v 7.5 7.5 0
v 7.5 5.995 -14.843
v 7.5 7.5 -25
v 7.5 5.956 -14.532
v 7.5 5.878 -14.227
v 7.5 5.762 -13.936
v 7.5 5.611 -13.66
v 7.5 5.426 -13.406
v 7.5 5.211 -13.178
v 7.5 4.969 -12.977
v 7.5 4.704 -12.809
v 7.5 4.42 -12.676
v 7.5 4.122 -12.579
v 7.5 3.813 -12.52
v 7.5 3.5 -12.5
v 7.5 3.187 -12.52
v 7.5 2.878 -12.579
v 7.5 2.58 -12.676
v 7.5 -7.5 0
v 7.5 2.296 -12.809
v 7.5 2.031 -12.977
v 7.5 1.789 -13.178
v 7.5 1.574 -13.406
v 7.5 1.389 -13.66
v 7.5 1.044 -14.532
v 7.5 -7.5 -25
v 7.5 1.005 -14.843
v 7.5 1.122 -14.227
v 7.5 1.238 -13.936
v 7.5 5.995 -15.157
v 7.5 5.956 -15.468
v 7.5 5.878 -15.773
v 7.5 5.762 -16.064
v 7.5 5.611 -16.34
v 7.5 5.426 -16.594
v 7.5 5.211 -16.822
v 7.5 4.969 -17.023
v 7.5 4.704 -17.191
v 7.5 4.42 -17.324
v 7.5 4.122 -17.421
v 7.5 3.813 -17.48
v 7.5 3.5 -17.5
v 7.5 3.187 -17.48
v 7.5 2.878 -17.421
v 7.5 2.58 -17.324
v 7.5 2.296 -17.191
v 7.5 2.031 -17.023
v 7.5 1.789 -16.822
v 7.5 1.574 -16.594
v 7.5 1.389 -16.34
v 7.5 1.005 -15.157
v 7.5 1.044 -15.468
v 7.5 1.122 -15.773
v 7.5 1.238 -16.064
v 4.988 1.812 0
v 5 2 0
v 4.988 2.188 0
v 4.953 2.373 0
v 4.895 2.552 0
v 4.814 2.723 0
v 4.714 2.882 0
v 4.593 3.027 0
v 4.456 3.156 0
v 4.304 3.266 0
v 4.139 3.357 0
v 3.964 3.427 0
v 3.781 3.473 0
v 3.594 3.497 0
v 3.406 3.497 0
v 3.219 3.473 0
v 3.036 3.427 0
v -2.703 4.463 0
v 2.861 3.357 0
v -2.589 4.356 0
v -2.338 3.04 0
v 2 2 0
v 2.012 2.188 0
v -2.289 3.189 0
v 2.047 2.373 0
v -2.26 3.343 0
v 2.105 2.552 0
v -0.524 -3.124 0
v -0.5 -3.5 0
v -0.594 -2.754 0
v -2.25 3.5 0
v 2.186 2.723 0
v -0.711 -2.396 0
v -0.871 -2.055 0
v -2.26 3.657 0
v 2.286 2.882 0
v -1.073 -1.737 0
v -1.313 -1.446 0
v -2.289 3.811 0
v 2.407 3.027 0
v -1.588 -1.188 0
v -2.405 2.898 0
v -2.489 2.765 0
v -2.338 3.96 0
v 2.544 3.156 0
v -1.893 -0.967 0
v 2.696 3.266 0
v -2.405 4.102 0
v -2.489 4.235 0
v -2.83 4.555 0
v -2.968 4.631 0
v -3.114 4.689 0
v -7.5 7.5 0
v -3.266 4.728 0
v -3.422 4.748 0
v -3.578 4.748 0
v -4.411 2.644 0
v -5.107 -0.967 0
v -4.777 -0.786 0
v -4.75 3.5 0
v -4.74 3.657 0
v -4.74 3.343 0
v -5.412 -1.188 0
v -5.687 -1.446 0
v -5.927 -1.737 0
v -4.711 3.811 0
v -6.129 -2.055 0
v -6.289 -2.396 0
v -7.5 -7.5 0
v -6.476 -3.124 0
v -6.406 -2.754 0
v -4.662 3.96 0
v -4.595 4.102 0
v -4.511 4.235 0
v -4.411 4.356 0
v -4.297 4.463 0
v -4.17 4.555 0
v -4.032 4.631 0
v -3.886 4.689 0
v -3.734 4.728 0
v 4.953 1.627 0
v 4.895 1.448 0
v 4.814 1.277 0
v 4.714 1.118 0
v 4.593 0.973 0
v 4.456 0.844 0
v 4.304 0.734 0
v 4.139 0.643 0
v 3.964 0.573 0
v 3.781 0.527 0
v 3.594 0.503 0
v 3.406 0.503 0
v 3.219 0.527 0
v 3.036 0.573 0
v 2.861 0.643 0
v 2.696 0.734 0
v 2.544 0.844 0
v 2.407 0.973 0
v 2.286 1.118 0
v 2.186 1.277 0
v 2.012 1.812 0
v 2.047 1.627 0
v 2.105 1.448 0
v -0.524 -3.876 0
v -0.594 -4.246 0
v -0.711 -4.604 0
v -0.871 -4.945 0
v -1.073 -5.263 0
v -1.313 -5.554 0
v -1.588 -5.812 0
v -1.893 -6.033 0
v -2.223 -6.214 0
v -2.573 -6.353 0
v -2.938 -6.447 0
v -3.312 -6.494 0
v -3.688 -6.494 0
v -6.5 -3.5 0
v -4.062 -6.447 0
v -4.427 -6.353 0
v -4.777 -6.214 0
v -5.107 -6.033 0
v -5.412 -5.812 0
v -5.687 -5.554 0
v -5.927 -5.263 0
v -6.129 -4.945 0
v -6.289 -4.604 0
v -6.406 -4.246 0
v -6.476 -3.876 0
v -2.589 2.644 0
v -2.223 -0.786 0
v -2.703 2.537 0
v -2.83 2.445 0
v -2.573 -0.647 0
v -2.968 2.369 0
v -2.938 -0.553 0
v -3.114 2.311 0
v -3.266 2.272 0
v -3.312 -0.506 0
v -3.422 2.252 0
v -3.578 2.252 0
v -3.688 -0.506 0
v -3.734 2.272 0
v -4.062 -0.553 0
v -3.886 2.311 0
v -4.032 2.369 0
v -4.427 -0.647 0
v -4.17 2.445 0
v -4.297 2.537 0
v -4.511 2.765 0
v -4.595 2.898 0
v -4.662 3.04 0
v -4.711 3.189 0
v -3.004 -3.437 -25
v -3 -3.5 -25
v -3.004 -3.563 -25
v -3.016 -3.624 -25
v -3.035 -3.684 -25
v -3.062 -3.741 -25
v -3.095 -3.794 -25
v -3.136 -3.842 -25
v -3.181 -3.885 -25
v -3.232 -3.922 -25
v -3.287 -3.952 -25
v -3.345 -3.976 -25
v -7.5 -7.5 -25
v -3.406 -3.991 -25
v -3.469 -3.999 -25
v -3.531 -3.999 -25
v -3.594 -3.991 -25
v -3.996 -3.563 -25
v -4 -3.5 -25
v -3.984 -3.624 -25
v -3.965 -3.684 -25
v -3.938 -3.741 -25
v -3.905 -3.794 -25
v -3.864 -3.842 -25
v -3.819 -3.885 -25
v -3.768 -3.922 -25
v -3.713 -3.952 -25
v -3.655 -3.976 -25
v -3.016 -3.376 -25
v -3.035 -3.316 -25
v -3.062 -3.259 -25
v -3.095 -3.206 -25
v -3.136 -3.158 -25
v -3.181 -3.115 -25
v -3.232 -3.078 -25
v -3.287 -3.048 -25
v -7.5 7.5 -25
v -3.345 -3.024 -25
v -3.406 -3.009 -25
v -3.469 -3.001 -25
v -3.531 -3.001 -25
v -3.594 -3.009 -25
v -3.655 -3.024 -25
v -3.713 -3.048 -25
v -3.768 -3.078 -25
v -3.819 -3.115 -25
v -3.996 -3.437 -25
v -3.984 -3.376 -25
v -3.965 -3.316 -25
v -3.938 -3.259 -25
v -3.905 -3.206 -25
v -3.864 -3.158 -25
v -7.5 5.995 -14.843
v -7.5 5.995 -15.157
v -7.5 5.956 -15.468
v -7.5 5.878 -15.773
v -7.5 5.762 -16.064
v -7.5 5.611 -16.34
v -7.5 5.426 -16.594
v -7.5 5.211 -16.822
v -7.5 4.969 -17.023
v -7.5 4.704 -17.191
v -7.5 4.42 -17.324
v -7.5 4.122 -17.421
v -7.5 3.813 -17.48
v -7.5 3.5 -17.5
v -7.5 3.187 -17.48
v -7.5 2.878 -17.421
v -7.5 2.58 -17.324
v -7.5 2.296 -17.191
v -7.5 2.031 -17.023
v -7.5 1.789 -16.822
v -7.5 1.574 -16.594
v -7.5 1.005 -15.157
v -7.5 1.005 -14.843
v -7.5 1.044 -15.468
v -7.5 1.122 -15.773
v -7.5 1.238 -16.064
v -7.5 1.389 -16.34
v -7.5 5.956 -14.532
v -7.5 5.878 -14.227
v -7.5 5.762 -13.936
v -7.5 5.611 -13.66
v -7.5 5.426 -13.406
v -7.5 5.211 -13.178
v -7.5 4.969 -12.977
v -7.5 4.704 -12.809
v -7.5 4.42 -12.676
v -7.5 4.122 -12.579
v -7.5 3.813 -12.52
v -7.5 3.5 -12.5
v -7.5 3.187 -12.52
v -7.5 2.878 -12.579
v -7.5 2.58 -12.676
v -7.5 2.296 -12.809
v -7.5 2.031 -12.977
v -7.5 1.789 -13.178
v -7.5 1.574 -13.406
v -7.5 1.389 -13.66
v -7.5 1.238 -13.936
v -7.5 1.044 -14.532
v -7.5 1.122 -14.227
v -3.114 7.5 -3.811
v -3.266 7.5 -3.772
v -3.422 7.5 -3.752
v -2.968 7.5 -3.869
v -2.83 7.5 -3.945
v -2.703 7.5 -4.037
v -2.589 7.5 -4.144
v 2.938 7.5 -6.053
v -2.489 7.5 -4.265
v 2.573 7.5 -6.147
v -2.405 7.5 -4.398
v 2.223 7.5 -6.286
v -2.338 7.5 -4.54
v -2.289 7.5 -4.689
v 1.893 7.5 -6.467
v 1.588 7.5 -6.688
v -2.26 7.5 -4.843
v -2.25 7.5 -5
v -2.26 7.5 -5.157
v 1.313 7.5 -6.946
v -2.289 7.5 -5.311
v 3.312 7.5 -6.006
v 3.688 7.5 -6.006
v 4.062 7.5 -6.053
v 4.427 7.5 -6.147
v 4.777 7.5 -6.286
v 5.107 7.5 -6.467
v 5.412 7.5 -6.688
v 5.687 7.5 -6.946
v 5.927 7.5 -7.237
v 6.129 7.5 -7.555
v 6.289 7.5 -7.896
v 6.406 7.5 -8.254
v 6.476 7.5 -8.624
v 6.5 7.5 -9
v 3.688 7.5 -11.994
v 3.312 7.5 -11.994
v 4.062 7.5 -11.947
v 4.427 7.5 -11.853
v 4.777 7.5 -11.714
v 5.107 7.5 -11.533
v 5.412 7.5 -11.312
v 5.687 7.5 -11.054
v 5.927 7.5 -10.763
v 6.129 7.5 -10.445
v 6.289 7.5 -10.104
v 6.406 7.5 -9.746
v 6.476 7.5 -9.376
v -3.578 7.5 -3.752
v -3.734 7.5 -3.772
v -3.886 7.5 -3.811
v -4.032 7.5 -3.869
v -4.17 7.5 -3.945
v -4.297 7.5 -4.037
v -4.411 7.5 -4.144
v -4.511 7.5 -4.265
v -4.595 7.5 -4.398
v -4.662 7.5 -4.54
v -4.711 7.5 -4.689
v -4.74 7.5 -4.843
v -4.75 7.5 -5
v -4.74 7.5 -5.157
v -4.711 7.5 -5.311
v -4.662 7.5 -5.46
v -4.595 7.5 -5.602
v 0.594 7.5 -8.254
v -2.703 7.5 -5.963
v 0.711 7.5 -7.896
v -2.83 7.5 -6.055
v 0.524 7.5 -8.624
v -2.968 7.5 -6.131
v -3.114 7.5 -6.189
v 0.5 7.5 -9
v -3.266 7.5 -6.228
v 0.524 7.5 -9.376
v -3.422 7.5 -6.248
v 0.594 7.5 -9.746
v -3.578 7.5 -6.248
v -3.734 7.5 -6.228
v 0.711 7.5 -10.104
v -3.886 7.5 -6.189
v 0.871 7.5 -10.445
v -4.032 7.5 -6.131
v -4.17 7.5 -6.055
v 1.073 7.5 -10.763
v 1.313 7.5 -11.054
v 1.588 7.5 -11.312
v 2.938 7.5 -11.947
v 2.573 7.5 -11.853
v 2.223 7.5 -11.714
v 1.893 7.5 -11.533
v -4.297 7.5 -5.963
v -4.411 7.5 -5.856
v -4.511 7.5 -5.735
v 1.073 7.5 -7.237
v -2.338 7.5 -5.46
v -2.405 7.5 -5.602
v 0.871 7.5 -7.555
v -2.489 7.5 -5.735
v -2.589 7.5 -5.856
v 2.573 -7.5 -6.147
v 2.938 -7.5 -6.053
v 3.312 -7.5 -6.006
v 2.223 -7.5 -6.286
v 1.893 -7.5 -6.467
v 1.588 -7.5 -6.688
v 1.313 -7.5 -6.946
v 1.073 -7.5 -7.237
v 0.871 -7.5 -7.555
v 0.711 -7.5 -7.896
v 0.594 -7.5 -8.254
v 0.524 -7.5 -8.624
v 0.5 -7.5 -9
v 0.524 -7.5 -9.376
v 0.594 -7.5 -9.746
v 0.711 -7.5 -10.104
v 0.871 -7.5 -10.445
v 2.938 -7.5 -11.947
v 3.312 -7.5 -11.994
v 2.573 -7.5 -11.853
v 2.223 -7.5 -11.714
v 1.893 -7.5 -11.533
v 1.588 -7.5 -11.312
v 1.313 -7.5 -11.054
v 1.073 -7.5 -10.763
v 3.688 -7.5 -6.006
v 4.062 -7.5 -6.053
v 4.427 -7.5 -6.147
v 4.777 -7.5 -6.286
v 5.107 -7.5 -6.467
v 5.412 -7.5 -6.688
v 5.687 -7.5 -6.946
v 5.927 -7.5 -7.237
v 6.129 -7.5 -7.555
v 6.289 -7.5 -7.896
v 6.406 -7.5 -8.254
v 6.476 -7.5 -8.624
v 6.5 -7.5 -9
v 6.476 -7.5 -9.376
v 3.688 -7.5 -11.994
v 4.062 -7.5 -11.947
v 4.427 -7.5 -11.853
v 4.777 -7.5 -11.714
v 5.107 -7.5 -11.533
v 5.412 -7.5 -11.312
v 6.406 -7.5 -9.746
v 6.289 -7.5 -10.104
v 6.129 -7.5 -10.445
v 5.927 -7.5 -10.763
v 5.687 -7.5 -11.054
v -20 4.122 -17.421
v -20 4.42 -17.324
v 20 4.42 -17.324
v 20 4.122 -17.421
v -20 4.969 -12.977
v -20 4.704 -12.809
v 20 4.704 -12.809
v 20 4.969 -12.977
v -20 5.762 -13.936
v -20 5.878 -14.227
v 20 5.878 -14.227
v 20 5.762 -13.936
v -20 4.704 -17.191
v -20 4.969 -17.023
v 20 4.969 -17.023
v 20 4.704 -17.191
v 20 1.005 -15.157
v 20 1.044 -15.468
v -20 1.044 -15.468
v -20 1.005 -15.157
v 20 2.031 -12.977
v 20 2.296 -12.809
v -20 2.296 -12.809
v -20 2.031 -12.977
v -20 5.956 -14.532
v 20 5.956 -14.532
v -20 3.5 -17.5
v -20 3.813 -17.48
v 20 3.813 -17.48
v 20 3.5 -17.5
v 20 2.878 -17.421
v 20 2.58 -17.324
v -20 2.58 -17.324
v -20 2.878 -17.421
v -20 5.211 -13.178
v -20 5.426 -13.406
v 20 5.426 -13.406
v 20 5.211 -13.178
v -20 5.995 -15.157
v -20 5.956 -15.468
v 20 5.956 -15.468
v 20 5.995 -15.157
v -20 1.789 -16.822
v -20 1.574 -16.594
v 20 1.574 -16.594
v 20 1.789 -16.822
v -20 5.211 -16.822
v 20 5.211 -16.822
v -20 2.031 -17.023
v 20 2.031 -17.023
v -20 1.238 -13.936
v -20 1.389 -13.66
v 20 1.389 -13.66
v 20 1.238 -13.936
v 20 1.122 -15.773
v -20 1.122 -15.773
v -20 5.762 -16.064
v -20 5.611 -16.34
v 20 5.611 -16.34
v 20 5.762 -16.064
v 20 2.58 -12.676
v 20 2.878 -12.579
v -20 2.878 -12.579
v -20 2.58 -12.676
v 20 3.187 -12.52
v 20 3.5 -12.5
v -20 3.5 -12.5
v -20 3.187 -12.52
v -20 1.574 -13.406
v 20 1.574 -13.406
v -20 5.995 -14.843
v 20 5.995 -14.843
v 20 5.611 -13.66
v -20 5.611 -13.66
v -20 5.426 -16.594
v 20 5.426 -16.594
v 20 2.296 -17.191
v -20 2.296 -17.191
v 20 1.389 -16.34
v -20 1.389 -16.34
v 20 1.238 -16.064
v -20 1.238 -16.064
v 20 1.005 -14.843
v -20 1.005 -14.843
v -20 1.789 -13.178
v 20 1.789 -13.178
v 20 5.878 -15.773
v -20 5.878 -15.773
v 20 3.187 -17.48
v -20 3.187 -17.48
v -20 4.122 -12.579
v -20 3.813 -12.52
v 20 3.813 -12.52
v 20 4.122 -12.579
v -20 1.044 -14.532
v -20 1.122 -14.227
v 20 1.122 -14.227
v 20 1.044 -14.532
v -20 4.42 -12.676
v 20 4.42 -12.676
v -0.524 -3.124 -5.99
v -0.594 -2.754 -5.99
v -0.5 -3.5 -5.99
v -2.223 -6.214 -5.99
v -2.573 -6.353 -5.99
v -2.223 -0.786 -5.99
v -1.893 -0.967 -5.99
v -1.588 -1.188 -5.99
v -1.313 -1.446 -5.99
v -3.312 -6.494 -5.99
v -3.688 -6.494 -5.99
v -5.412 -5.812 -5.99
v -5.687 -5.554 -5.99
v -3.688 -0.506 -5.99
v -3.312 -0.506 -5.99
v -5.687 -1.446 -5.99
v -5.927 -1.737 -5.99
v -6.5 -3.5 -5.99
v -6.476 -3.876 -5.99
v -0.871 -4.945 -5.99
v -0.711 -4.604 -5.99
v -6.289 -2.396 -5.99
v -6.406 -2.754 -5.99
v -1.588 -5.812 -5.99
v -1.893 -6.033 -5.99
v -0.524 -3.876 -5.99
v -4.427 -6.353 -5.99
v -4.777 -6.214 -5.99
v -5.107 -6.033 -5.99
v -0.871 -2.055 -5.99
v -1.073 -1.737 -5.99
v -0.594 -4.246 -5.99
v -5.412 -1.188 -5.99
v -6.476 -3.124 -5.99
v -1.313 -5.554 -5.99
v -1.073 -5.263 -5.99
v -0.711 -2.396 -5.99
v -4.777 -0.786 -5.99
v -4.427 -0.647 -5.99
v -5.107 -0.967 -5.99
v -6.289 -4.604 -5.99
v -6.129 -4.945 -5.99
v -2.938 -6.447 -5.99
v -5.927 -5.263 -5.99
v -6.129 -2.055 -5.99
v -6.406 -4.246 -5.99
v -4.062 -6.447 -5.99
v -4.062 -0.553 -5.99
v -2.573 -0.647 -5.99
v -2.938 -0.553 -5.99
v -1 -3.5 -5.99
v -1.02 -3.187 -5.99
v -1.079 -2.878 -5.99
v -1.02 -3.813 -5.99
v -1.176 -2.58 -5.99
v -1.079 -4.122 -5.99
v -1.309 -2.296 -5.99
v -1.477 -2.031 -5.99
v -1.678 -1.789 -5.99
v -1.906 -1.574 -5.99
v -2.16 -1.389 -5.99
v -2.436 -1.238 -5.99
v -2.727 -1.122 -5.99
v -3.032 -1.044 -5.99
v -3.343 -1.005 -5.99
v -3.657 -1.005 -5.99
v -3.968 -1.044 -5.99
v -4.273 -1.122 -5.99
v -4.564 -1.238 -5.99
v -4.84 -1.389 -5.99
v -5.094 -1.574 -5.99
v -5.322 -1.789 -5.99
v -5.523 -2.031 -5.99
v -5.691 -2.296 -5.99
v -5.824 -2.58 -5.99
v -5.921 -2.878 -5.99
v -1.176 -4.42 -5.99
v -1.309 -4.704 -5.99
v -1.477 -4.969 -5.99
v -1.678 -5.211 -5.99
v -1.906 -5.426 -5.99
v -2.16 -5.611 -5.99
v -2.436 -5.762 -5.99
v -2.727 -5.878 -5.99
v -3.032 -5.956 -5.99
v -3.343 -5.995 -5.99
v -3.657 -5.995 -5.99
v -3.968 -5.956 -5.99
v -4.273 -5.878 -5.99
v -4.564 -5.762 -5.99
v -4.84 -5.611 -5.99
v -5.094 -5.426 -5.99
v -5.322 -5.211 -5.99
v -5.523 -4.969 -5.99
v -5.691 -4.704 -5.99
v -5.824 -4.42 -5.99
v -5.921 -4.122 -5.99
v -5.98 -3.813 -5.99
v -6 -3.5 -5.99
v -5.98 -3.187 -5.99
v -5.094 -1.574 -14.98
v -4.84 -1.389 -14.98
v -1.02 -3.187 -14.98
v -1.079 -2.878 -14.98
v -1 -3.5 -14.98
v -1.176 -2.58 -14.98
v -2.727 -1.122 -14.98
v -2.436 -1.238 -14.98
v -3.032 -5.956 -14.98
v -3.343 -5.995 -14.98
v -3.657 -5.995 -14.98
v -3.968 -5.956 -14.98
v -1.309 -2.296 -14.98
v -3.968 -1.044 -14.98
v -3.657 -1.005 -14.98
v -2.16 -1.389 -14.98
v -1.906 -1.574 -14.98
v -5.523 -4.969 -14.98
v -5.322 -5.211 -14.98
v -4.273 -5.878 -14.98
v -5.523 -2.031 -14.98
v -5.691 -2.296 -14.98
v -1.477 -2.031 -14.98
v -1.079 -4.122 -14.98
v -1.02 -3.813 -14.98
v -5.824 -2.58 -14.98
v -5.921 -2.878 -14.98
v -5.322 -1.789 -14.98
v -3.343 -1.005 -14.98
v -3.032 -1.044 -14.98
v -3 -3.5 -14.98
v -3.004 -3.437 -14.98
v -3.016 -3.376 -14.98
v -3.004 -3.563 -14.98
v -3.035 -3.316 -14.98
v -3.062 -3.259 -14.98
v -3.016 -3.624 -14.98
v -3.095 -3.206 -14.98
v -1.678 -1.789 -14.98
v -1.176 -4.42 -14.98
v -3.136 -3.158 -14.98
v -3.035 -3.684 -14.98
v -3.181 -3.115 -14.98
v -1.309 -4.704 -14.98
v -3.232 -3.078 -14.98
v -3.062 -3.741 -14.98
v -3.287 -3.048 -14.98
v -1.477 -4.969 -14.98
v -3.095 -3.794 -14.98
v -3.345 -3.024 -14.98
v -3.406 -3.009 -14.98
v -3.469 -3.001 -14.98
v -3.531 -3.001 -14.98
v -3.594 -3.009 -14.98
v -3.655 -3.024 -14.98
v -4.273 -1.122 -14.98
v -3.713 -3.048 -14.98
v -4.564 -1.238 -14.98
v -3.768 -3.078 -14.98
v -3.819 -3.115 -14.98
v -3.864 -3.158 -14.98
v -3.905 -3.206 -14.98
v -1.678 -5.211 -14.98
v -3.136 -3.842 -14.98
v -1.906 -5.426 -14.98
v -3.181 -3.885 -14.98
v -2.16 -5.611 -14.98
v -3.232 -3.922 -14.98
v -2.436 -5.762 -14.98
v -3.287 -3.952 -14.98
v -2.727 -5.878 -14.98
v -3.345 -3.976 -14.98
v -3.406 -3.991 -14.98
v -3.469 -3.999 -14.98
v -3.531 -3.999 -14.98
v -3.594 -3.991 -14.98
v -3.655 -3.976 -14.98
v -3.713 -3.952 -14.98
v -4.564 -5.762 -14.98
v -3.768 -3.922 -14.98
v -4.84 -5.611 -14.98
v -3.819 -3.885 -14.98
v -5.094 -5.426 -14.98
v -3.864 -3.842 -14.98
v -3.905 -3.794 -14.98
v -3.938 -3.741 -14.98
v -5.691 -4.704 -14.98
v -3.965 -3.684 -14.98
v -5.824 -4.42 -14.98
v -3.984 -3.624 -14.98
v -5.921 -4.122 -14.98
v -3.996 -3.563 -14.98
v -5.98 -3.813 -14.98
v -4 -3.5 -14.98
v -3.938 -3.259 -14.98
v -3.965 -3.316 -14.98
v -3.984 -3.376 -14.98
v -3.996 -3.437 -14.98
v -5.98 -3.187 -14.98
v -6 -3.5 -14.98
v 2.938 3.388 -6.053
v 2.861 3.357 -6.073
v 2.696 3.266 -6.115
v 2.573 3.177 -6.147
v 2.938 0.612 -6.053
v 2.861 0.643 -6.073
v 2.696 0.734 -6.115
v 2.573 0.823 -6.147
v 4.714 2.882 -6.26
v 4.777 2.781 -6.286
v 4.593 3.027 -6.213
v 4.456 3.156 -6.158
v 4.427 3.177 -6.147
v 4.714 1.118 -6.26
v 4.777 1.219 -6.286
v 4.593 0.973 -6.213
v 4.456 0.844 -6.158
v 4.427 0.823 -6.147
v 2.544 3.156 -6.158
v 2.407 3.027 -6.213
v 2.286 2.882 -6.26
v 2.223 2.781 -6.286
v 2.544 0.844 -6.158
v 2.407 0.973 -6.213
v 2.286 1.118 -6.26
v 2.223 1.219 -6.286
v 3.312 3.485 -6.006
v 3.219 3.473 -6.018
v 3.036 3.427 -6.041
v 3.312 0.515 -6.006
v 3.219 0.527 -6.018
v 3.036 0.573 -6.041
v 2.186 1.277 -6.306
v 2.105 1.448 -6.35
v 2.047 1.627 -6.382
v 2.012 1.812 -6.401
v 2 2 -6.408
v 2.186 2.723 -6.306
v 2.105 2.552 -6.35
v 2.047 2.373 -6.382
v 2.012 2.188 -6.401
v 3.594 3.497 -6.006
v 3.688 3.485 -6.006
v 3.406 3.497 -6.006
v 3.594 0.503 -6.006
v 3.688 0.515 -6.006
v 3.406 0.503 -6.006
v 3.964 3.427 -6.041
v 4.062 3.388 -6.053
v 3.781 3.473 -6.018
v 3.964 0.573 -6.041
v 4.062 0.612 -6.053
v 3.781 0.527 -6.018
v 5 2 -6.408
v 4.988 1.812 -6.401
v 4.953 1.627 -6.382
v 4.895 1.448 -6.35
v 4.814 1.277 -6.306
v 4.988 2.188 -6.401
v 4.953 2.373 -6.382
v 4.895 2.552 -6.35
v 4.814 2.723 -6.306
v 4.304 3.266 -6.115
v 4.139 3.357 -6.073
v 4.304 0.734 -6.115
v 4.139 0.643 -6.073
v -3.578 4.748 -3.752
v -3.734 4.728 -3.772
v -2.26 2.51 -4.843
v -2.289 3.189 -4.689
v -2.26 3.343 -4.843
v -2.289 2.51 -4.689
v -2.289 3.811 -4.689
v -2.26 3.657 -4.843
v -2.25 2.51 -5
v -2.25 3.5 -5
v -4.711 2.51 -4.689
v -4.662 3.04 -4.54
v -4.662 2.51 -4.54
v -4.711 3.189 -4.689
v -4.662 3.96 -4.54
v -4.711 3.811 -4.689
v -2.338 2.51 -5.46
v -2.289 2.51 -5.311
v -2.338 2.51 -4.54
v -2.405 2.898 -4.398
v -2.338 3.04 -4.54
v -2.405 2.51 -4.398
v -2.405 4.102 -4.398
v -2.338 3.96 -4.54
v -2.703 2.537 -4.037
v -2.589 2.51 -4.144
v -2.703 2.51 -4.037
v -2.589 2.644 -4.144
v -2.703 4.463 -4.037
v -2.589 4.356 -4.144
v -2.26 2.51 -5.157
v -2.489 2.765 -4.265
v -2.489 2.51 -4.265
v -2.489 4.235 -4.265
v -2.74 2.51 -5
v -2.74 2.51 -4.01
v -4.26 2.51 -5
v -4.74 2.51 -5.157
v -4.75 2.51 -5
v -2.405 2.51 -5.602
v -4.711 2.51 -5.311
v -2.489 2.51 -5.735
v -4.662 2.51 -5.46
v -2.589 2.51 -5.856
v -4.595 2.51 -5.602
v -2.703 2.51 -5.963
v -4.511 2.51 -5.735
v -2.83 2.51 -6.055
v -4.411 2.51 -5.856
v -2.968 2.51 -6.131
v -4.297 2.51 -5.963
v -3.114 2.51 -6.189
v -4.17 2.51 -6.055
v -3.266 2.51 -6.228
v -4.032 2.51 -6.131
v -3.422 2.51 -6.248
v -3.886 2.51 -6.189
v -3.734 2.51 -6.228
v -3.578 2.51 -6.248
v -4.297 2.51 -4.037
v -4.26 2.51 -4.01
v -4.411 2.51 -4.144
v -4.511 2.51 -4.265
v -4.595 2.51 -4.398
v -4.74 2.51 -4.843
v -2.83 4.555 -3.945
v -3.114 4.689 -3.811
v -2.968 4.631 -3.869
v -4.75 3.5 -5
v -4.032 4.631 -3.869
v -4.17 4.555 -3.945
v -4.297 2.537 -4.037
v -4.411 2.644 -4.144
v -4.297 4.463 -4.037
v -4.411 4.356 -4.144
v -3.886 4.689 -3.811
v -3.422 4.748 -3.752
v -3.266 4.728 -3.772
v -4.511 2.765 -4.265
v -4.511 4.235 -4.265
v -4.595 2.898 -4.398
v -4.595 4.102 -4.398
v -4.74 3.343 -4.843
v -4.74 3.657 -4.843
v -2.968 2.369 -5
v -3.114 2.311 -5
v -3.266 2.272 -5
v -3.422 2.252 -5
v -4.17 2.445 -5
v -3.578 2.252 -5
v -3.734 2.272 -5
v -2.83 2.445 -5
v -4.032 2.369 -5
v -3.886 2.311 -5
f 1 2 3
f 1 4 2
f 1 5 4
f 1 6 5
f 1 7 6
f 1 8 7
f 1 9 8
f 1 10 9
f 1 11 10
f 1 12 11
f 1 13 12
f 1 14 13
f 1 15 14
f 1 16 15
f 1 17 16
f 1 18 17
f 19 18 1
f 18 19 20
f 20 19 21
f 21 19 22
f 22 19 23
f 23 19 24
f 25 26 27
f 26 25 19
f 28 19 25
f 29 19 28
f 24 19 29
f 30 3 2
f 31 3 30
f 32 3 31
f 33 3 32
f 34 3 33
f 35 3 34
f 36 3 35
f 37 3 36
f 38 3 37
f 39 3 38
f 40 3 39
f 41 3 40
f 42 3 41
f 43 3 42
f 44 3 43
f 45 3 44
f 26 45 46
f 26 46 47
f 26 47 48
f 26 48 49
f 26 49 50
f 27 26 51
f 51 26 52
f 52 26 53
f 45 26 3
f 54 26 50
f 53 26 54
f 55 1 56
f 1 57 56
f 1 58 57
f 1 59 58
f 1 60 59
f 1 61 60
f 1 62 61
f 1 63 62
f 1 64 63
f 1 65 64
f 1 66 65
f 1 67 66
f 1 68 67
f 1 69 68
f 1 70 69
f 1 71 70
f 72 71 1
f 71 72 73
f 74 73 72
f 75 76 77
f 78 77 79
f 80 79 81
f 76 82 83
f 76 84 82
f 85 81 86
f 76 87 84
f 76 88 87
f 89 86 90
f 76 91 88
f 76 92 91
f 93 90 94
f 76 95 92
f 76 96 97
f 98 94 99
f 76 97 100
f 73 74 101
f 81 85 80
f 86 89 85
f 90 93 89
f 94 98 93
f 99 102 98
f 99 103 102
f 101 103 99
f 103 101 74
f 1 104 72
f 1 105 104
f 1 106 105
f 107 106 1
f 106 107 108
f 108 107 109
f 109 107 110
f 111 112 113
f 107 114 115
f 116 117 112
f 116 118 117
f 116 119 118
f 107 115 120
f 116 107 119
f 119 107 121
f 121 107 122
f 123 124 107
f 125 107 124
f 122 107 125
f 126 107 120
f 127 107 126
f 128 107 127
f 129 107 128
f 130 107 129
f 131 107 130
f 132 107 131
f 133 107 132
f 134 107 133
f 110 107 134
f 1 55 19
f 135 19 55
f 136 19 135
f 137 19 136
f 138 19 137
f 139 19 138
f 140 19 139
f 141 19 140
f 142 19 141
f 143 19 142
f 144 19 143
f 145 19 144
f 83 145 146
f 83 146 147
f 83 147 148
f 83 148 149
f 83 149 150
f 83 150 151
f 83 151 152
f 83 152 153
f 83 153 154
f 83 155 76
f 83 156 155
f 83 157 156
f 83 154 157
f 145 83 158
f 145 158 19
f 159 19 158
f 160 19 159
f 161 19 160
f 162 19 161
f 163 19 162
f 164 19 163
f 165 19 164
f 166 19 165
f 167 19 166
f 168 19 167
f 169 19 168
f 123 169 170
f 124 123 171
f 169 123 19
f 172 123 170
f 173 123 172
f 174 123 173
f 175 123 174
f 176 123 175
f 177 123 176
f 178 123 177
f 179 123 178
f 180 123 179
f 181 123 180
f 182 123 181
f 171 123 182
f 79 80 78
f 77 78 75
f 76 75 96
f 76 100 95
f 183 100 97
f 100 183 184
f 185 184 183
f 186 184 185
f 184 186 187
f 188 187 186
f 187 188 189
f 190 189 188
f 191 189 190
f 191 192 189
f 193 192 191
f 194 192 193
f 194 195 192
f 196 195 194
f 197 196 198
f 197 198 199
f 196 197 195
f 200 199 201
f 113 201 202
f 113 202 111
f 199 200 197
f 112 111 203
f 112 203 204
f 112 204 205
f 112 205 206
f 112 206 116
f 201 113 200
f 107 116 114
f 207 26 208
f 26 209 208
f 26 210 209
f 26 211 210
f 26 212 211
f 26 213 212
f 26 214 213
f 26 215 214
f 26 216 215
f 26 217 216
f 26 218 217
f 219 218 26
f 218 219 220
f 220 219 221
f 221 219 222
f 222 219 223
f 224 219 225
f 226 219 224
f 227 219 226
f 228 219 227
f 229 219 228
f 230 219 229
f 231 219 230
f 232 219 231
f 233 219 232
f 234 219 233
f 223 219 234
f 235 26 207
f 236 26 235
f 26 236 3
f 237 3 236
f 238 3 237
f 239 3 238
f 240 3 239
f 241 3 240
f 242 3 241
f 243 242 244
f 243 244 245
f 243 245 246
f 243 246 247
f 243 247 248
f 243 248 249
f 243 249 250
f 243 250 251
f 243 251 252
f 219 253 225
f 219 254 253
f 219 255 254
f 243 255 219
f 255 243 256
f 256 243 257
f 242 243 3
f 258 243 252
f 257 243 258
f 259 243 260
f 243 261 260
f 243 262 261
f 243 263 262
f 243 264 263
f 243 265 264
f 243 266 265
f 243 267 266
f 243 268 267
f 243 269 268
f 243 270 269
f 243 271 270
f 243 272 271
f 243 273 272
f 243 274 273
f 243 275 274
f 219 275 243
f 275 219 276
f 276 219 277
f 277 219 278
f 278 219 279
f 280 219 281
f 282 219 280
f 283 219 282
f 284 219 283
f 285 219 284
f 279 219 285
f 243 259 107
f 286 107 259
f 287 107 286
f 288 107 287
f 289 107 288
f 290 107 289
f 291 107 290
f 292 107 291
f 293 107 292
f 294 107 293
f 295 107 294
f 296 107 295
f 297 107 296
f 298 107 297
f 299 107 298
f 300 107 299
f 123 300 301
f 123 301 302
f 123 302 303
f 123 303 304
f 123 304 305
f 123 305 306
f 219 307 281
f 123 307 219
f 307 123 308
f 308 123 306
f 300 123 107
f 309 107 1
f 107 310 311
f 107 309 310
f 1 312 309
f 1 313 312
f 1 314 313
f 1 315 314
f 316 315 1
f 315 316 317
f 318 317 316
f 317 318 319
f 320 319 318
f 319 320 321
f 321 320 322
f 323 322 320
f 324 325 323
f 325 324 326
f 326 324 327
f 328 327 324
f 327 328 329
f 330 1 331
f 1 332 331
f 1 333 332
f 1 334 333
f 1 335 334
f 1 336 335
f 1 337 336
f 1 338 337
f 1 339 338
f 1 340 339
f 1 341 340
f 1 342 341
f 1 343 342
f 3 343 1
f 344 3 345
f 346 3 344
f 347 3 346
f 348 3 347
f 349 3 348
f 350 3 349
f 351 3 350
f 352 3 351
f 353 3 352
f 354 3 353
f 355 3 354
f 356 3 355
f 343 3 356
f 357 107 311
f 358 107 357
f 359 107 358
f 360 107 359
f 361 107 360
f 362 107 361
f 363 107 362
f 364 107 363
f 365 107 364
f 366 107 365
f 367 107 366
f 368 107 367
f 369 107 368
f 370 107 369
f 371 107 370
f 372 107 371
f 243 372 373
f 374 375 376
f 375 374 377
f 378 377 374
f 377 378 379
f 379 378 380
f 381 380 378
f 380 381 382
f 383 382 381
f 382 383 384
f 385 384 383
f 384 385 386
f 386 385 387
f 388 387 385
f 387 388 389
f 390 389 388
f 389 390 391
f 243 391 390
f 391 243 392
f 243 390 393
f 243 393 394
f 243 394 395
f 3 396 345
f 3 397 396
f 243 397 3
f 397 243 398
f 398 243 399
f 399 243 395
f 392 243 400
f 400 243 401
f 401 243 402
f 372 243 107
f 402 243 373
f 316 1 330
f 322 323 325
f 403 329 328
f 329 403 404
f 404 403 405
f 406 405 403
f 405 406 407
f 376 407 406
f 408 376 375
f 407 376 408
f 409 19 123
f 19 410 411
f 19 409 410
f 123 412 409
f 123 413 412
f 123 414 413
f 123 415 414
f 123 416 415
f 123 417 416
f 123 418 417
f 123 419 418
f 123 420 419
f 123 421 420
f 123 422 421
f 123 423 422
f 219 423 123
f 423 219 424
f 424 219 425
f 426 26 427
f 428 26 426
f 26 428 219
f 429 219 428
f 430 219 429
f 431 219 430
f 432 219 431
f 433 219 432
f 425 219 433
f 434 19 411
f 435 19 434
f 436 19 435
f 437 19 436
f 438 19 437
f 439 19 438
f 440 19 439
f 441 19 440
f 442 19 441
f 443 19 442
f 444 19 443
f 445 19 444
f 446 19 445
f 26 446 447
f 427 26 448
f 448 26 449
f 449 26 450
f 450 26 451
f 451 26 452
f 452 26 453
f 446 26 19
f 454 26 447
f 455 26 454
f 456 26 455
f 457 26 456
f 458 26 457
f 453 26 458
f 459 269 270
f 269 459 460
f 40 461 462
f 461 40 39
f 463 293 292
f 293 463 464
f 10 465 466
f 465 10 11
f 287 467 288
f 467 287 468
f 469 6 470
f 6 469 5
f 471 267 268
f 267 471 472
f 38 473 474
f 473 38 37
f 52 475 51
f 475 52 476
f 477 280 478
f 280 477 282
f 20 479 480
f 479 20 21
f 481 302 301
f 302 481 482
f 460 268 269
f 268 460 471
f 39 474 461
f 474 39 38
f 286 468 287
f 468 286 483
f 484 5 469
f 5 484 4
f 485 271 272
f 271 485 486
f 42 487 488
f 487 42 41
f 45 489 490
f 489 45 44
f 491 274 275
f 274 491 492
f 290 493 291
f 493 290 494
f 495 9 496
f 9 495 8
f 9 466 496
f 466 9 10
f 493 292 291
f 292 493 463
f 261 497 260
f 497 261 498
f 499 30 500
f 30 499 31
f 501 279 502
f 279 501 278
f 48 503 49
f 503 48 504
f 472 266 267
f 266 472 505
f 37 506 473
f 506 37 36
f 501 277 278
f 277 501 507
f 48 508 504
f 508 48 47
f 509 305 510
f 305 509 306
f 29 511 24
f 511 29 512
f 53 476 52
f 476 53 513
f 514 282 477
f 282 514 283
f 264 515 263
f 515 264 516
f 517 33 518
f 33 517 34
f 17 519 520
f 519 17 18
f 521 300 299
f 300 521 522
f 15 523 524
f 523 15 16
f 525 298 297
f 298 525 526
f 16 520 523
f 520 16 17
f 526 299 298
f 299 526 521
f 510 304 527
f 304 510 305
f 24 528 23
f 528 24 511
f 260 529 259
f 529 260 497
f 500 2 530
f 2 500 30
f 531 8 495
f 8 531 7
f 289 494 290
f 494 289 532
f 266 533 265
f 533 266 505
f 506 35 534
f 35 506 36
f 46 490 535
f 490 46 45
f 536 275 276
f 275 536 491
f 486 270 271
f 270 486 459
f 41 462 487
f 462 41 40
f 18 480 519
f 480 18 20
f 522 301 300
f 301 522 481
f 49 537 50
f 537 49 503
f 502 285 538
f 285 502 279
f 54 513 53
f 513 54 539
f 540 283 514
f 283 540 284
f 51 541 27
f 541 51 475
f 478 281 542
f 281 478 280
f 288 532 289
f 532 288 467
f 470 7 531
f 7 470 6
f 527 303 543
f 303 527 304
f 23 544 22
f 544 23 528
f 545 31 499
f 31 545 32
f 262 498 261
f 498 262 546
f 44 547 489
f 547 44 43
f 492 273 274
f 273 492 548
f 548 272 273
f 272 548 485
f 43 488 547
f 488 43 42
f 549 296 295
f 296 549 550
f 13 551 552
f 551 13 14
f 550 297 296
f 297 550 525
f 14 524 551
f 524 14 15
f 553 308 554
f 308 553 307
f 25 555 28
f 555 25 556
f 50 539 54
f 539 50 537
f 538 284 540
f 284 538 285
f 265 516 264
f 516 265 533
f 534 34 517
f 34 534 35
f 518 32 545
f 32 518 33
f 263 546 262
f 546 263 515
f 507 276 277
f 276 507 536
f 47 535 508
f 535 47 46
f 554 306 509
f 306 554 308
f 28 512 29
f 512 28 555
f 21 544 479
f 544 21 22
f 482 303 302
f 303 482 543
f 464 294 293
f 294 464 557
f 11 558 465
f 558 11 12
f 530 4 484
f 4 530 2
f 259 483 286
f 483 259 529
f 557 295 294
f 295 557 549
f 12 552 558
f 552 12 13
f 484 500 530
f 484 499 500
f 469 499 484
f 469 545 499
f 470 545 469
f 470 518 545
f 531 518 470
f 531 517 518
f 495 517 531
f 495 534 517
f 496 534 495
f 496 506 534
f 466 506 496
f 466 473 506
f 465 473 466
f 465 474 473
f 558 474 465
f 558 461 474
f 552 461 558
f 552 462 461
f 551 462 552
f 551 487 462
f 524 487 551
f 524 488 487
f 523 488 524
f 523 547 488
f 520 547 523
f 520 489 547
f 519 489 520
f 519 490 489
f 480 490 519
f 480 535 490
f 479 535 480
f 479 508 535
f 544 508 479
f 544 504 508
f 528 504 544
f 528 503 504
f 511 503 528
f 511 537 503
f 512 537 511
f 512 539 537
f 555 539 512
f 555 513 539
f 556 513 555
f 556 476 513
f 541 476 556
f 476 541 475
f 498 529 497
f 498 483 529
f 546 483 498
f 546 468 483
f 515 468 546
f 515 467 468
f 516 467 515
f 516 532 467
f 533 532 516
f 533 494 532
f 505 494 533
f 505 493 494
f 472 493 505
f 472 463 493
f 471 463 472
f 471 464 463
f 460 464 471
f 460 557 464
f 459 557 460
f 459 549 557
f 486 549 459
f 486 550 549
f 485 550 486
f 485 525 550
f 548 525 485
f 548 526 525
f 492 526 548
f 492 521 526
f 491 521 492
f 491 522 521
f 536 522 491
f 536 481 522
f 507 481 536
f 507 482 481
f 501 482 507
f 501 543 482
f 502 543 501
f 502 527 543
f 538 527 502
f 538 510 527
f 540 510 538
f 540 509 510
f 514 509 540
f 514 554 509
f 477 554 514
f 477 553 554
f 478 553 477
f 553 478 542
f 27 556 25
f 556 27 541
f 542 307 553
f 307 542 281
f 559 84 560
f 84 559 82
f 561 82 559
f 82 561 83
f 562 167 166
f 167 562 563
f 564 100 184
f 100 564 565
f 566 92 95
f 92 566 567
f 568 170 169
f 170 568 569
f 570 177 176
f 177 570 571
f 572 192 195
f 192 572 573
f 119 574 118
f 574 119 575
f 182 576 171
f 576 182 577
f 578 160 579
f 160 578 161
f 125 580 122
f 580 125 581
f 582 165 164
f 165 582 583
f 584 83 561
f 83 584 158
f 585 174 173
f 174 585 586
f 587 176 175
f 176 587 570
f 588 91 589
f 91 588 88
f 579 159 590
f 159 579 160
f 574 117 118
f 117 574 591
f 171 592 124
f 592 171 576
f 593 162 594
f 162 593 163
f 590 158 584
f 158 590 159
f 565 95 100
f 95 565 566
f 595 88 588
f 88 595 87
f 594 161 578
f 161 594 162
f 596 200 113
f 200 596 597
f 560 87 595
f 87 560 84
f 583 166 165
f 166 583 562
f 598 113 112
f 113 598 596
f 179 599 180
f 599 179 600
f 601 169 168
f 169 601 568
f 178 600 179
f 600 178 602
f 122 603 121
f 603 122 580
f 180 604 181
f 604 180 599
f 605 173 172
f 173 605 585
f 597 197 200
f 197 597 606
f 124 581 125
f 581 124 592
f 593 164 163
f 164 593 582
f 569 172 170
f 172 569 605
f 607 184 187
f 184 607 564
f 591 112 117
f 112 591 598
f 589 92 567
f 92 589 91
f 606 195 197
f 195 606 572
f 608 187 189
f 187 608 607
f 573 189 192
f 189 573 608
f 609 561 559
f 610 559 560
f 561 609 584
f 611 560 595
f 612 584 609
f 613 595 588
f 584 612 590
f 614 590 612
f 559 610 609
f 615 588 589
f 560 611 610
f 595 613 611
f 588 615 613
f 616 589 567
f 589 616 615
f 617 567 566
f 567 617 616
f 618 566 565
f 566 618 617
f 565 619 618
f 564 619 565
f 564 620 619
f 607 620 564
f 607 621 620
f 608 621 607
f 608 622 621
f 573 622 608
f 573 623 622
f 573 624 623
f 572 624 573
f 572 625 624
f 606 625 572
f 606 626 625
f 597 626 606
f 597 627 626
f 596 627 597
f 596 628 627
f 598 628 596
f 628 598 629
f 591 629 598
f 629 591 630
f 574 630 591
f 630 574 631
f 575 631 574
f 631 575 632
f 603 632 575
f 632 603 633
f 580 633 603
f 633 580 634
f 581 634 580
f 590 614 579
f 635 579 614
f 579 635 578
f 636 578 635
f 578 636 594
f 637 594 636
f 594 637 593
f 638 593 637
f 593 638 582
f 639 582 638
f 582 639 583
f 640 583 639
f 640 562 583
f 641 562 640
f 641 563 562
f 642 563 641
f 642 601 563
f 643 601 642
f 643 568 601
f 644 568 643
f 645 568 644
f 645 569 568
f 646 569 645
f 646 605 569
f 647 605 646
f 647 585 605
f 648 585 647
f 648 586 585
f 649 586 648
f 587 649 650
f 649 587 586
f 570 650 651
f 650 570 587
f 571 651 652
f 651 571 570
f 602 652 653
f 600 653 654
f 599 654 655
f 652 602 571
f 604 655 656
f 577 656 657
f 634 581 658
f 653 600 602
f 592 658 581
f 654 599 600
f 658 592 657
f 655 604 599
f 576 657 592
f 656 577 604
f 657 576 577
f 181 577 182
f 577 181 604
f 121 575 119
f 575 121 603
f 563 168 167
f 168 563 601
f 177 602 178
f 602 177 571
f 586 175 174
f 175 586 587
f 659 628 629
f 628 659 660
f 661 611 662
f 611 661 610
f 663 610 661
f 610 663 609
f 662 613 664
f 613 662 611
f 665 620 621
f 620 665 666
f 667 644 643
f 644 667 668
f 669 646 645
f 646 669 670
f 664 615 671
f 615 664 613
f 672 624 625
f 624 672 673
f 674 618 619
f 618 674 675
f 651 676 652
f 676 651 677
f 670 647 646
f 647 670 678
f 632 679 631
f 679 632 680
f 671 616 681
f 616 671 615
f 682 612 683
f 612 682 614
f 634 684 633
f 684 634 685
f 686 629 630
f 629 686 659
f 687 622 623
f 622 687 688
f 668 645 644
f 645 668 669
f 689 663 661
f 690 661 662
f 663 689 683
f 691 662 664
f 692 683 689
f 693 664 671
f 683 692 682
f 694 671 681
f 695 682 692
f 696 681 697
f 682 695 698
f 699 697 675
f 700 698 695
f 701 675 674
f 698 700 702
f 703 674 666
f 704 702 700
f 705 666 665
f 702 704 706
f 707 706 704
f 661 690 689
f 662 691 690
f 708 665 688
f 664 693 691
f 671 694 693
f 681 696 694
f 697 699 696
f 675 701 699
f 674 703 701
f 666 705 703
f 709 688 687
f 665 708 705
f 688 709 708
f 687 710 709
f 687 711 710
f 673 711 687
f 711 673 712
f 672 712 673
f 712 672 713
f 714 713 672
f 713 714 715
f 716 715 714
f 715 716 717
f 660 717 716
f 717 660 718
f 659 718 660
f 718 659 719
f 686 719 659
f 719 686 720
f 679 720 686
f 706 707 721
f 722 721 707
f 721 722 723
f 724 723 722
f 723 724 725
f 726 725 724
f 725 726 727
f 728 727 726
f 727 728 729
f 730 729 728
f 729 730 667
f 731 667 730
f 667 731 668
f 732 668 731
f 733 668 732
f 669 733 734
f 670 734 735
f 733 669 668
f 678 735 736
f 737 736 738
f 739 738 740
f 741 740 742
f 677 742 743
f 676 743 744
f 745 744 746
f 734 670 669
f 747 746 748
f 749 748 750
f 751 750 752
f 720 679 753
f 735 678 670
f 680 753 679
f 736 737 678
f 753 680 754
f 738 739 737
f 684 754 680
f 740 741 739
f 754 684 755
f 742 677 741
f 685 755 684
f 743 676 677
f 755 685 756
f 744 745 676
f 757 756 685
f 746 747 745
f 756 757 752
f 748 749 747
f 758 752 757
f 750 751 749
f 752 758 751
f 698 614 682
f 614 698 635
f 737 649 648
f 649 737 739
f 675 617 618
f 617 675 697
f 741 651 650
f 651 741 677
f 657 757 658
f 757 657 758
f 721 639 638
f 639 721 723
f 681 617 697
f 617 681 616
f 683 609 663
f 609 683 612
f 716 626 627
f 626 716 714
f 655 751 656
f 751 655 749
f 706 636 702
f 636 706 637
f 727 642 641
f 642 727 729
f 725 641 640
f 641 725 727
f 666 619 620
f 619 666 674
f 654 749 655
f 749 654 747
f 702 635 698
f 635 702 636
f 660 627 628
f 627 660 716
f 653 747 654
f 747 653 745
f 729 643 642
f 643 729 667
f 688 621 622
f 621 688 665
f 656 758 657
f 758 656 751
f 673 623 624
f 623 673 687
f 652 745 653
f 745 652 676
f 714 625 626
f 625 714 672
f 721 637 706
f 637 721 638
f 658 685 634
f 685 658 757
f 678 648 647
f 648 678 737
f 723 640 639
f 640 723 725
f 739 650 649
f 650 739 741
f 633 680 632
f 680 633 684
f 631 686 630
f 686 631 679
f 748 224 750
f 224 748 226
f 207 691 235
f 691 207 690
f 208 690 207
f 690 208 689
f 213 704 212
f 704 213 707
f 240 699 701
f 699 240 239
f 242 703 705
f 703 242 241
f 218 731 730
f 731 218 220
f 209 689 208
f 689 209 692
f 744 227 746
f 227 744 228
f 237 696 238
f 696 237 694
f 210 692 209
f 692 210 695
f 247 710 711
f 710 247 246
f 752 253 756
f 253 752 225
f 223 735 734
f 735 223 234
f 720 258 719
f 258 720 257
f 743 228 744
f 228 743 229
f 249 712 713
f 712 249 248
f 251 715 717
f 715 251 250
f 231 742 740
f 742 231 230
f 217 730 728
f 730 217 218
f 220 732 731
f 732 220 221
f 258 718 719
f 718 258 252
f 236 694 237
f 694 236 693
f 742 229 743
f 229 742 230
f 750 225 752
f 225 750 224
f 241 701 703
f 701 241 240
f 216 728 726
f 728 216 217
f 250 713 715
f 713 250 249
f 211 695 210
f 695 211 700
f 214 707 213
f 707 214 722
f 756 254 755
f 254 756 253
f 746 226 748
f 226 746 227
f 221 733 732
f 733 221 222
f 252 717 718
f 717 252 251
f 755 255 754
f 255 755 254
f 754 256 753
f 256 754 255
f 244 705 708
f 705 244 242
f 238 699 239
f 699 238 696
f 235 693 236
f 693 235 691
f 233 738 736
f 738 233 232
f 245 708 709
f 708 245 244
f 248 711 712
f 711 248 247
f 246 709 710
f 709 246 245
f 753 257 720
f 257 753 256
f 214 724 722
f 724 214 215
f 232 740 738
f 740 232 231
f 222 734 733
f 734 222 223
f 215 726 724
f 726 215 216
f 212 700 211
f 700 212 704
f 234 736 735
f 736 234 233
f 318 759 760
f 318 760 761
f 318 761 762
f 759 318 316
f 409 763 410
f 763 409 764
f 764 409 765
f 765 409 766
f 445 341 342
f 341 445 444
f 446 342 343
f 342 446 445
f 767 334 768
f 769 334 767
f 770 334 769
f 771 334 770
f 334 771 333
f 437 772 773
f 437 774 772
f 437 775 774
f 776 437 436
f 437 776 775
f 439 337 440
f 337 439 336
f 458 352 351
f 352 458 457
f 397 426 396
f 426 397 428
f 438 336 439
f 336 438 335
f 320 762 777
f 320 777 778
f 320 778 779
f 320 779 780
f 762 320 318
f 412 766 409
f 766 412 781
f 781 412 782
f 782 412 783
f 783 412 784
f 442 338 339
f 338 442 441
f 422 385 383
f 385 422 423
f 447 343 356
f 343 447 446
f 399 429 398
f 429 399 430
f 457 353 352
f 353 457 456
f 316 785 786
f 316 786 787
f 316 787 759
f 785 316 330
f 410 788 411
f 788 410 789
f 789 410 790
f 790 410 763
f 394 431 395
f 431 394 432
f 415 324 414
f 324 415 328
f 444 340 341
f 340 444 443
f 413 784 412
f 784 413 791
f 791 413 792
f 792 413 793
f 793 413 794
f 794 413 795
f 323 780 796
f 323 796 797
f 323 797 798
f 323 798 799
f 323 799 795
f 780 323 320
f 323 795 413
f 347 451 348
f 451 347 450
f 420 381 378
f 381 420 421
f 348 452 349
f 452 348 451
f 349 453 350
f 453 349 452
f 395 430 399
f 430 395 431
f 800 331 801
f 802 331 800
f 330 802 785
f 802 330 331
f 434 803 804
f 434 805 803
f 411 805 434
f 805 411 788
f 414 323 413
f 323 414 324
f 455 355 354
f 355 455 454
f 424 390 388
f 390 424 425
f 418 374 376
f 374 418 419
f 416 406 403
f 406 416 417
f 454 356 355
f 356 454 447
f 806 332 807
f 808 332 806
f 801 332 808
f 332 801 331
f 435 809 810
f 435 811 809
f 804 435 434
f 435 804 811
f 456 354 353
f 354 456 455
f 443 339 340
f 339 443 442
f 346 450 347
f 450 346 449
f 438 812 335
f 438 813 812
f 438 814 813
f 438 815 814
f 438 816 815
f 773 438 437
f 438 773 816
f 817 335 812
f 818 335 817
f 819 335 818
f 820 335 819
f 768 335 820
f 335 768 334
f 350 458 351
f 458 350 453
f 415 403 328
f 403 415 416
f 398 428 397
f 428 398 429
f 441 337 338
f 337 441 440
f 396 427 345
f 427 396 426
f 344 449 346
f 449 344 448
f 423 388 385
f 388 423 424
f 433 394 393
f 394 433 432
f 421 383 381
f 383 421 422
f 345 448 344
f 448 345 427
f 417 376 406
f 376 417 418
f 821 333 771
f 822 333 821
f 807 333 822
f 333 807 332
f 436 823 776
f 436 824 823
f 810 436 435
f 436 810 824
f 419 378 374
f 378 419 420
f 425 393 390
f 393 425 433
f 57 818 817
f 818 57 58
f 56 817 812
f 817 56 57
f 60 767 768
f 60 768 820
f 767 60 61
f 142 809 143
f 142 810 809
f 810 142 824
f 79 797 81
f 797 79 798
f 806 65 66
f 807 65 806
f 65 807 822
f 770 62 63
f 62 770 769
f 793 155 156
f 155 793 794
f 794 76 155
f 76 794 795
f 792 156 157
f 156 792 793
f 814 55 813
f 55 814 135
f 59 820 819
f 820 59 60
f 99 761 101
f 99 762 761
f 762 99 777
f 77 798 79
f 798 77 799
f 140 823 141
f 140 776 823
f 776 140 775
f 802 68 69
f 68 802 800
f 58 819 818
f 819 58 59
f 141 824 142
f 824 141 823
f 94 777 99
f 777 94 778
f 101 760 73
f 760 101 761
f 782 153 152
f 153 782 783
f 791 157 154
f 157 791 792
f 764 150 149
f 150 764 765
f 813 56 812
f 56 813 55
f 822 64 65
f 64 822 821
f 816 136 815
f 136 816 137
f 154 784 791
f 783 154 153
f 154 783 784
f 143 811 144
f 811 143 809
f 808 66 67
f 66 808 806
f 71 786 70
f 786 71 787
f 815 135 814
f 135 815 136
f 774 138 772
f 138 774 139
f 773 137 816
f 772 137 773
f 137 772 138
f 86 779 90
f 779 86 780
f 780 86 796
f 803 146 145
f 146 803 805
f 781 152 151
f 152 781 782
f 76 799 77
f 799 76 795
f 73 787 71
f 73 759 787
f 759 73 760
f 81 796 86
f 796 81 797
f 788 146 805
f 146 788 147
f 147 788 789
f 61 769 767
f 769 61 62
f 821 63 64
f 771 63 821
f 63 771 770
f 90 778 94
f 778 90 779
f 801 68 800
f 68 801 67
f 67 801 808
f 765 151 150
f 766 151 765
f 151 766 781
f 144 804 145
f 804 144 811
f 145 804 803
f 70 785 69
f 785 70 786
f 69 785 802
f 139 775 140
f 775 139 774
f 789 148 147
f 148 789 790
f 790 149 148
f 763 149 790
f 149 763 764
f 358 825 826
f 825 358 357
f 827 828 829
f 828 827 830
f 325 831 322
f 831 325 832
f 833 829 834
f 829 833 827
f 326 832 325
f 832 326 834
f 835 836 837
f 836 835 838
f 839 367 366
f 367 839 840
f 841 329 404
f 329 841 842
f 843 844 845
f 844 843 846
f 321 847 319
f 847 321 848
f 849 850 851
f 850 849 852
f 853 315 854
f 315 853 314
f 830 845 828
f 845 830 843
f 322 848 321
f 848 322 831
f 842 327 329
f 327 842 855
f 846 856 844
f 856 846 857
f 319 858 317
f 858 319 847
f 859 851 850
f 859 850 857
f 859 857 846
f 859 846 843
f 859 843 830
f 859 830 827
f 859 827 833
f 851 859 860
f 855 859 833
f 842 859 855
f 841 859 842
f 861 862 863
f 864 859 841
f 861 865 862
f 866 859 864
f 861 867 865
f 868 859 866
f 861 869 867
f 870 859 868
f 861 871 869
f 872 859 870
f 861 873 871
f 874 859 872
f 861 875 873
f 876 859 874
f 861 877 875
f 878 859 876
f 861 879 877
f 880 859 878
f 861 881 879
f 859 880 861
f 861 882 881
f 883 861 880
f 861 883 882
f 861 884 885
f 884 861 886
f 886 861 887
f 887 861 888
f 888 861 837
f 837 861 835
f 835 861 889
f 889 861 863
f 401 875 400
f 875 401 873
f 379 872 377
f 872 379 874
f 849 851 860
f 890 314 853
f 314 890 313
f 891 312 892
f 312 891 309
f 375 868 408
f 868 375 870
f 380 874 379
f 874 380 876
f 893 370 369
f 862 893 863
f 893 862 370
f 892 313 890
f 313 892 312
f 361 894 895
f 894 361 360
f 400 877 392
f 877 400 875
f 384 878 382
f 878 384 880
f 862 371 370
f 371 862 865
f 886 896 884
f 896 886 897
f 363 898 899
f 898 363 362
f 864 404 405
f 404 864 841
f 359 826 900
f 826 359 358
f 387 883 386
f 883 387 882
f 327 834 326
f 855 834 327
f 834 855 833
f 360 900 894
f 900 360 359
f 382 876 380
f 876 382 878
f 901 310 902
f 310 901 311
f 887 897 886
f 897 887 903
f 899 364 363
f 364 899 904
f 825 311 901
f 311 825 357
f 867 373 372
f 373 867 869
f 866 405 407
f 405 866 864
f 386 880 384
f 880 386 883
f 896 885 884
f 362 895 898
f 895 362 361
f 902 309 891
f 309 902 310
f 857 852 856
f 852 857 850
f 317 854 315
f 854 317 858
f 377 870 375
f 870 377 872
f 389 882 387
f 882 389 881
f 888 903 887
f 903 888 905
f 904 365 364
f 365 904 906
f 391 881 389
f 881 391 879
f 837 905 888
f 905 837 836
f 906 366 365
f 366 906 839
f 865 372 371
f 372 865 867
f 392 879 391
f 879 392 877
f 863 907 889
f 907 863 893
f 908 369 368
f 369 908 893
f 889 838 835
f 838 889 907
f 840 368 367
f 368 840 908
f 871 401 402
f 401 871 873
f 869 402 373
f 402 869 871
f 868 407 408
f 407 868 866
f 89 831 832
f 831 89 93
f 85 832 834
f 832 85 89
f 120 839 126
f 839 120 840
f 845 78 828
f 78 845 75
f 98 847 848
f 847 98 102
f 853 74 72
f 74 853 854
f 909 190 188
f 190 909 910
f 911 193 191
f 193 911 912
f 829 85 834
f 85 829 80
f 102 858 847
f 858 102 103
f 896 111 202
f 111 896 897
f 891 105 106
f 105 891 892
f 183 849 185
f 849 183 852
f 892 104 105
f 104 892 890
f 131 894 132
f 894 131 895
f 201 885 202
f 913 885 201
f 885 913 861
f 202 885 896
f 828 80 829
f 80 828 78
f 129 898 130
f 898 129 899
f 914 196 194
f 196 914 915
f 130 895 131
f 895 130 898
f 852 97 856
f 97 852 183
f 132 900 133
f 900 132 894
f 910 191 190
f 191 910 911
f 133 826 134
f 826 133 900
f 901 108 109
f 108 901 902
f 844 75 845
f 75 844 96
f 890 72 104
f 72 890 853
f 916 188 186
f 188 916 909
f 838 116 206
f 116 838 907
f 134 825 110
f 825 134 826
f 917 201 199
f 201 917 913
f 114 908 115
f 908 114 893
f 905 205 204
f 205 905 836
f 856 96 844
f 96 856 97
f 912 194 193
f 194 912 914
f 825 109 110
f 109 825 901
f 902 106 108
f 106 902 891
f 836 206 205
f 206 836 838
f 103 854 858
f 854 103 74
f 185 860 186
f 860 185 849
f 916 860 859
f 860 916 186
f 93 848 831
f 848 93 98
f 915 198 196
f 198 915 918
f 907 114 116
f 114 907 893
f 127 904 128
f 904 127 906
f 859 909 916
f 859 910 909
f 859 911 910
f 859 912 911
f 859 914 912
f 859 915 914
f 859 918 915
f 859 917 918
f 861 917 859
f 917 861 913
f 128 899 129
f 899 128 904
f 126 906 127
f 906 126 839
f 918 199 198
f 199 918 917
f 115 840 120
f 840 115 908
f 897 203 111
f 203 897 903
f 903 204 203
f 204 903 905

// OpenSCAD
// Smoooooooth
$fn = 50;

heat_block(tip="luer");

module heat_block(w=15, h=25, luer_offset=-3.5, tip="luer") {
	//translate([luer_offset, axis_offset+syringe_axis_offset-abs(luer_offset), -108]) {
	difference() {
		union() {
			//base block
			translate([0, 0, -h/2]) cube(size=[w, w, h], center=true);
			//mount screw
			translate([0, -luer_offset, -15]) rotate([0, 90, 0]) cylinder(r=2.5, h=40, center=true);
		}
		//heater cartridge
		translate([3.5, 0, -9]) rotate([90, 0, 0]) cylinder(r=3, h=w+1, center=true);
		translate([3.5, 2, -4]) cylinder(r=1.5, h=10, center=true);

		//thermistor
		translate([-3.5, w/2-2.49, -5]) rotate([90, 0, 0]) cylinder(r=1.25, h=5, center=true);
		translate([-3.5, w/2-4, -5]) cylinder(r=1.25, h=5.5, center=false);

		//luer tip
		if(tip=="luer") {
			translate([luer_offset, luer_offset, -6+0.01]) cylinder(r=3, h=6, center=false);
			translate([luer_offset, luer_offset, -9-6+0.02]) cylinder(r=2.5, h=9, center=false);
			translate([luer_offset, luer_offset, -h-0.5])cylinder(r=0.5, h=h+1, center=false);
		}
		if(tip=="luer_lock") {
			//translate([luer_offset, luer_offset, -5+h/2+0.01]) cylinder(r=5, h=10, center=true);
		}
	}
		//translate([0, -4, -5]) rotate([0, 90, 0]) cylinder(r=2.7, h=40, center=true);	
}
